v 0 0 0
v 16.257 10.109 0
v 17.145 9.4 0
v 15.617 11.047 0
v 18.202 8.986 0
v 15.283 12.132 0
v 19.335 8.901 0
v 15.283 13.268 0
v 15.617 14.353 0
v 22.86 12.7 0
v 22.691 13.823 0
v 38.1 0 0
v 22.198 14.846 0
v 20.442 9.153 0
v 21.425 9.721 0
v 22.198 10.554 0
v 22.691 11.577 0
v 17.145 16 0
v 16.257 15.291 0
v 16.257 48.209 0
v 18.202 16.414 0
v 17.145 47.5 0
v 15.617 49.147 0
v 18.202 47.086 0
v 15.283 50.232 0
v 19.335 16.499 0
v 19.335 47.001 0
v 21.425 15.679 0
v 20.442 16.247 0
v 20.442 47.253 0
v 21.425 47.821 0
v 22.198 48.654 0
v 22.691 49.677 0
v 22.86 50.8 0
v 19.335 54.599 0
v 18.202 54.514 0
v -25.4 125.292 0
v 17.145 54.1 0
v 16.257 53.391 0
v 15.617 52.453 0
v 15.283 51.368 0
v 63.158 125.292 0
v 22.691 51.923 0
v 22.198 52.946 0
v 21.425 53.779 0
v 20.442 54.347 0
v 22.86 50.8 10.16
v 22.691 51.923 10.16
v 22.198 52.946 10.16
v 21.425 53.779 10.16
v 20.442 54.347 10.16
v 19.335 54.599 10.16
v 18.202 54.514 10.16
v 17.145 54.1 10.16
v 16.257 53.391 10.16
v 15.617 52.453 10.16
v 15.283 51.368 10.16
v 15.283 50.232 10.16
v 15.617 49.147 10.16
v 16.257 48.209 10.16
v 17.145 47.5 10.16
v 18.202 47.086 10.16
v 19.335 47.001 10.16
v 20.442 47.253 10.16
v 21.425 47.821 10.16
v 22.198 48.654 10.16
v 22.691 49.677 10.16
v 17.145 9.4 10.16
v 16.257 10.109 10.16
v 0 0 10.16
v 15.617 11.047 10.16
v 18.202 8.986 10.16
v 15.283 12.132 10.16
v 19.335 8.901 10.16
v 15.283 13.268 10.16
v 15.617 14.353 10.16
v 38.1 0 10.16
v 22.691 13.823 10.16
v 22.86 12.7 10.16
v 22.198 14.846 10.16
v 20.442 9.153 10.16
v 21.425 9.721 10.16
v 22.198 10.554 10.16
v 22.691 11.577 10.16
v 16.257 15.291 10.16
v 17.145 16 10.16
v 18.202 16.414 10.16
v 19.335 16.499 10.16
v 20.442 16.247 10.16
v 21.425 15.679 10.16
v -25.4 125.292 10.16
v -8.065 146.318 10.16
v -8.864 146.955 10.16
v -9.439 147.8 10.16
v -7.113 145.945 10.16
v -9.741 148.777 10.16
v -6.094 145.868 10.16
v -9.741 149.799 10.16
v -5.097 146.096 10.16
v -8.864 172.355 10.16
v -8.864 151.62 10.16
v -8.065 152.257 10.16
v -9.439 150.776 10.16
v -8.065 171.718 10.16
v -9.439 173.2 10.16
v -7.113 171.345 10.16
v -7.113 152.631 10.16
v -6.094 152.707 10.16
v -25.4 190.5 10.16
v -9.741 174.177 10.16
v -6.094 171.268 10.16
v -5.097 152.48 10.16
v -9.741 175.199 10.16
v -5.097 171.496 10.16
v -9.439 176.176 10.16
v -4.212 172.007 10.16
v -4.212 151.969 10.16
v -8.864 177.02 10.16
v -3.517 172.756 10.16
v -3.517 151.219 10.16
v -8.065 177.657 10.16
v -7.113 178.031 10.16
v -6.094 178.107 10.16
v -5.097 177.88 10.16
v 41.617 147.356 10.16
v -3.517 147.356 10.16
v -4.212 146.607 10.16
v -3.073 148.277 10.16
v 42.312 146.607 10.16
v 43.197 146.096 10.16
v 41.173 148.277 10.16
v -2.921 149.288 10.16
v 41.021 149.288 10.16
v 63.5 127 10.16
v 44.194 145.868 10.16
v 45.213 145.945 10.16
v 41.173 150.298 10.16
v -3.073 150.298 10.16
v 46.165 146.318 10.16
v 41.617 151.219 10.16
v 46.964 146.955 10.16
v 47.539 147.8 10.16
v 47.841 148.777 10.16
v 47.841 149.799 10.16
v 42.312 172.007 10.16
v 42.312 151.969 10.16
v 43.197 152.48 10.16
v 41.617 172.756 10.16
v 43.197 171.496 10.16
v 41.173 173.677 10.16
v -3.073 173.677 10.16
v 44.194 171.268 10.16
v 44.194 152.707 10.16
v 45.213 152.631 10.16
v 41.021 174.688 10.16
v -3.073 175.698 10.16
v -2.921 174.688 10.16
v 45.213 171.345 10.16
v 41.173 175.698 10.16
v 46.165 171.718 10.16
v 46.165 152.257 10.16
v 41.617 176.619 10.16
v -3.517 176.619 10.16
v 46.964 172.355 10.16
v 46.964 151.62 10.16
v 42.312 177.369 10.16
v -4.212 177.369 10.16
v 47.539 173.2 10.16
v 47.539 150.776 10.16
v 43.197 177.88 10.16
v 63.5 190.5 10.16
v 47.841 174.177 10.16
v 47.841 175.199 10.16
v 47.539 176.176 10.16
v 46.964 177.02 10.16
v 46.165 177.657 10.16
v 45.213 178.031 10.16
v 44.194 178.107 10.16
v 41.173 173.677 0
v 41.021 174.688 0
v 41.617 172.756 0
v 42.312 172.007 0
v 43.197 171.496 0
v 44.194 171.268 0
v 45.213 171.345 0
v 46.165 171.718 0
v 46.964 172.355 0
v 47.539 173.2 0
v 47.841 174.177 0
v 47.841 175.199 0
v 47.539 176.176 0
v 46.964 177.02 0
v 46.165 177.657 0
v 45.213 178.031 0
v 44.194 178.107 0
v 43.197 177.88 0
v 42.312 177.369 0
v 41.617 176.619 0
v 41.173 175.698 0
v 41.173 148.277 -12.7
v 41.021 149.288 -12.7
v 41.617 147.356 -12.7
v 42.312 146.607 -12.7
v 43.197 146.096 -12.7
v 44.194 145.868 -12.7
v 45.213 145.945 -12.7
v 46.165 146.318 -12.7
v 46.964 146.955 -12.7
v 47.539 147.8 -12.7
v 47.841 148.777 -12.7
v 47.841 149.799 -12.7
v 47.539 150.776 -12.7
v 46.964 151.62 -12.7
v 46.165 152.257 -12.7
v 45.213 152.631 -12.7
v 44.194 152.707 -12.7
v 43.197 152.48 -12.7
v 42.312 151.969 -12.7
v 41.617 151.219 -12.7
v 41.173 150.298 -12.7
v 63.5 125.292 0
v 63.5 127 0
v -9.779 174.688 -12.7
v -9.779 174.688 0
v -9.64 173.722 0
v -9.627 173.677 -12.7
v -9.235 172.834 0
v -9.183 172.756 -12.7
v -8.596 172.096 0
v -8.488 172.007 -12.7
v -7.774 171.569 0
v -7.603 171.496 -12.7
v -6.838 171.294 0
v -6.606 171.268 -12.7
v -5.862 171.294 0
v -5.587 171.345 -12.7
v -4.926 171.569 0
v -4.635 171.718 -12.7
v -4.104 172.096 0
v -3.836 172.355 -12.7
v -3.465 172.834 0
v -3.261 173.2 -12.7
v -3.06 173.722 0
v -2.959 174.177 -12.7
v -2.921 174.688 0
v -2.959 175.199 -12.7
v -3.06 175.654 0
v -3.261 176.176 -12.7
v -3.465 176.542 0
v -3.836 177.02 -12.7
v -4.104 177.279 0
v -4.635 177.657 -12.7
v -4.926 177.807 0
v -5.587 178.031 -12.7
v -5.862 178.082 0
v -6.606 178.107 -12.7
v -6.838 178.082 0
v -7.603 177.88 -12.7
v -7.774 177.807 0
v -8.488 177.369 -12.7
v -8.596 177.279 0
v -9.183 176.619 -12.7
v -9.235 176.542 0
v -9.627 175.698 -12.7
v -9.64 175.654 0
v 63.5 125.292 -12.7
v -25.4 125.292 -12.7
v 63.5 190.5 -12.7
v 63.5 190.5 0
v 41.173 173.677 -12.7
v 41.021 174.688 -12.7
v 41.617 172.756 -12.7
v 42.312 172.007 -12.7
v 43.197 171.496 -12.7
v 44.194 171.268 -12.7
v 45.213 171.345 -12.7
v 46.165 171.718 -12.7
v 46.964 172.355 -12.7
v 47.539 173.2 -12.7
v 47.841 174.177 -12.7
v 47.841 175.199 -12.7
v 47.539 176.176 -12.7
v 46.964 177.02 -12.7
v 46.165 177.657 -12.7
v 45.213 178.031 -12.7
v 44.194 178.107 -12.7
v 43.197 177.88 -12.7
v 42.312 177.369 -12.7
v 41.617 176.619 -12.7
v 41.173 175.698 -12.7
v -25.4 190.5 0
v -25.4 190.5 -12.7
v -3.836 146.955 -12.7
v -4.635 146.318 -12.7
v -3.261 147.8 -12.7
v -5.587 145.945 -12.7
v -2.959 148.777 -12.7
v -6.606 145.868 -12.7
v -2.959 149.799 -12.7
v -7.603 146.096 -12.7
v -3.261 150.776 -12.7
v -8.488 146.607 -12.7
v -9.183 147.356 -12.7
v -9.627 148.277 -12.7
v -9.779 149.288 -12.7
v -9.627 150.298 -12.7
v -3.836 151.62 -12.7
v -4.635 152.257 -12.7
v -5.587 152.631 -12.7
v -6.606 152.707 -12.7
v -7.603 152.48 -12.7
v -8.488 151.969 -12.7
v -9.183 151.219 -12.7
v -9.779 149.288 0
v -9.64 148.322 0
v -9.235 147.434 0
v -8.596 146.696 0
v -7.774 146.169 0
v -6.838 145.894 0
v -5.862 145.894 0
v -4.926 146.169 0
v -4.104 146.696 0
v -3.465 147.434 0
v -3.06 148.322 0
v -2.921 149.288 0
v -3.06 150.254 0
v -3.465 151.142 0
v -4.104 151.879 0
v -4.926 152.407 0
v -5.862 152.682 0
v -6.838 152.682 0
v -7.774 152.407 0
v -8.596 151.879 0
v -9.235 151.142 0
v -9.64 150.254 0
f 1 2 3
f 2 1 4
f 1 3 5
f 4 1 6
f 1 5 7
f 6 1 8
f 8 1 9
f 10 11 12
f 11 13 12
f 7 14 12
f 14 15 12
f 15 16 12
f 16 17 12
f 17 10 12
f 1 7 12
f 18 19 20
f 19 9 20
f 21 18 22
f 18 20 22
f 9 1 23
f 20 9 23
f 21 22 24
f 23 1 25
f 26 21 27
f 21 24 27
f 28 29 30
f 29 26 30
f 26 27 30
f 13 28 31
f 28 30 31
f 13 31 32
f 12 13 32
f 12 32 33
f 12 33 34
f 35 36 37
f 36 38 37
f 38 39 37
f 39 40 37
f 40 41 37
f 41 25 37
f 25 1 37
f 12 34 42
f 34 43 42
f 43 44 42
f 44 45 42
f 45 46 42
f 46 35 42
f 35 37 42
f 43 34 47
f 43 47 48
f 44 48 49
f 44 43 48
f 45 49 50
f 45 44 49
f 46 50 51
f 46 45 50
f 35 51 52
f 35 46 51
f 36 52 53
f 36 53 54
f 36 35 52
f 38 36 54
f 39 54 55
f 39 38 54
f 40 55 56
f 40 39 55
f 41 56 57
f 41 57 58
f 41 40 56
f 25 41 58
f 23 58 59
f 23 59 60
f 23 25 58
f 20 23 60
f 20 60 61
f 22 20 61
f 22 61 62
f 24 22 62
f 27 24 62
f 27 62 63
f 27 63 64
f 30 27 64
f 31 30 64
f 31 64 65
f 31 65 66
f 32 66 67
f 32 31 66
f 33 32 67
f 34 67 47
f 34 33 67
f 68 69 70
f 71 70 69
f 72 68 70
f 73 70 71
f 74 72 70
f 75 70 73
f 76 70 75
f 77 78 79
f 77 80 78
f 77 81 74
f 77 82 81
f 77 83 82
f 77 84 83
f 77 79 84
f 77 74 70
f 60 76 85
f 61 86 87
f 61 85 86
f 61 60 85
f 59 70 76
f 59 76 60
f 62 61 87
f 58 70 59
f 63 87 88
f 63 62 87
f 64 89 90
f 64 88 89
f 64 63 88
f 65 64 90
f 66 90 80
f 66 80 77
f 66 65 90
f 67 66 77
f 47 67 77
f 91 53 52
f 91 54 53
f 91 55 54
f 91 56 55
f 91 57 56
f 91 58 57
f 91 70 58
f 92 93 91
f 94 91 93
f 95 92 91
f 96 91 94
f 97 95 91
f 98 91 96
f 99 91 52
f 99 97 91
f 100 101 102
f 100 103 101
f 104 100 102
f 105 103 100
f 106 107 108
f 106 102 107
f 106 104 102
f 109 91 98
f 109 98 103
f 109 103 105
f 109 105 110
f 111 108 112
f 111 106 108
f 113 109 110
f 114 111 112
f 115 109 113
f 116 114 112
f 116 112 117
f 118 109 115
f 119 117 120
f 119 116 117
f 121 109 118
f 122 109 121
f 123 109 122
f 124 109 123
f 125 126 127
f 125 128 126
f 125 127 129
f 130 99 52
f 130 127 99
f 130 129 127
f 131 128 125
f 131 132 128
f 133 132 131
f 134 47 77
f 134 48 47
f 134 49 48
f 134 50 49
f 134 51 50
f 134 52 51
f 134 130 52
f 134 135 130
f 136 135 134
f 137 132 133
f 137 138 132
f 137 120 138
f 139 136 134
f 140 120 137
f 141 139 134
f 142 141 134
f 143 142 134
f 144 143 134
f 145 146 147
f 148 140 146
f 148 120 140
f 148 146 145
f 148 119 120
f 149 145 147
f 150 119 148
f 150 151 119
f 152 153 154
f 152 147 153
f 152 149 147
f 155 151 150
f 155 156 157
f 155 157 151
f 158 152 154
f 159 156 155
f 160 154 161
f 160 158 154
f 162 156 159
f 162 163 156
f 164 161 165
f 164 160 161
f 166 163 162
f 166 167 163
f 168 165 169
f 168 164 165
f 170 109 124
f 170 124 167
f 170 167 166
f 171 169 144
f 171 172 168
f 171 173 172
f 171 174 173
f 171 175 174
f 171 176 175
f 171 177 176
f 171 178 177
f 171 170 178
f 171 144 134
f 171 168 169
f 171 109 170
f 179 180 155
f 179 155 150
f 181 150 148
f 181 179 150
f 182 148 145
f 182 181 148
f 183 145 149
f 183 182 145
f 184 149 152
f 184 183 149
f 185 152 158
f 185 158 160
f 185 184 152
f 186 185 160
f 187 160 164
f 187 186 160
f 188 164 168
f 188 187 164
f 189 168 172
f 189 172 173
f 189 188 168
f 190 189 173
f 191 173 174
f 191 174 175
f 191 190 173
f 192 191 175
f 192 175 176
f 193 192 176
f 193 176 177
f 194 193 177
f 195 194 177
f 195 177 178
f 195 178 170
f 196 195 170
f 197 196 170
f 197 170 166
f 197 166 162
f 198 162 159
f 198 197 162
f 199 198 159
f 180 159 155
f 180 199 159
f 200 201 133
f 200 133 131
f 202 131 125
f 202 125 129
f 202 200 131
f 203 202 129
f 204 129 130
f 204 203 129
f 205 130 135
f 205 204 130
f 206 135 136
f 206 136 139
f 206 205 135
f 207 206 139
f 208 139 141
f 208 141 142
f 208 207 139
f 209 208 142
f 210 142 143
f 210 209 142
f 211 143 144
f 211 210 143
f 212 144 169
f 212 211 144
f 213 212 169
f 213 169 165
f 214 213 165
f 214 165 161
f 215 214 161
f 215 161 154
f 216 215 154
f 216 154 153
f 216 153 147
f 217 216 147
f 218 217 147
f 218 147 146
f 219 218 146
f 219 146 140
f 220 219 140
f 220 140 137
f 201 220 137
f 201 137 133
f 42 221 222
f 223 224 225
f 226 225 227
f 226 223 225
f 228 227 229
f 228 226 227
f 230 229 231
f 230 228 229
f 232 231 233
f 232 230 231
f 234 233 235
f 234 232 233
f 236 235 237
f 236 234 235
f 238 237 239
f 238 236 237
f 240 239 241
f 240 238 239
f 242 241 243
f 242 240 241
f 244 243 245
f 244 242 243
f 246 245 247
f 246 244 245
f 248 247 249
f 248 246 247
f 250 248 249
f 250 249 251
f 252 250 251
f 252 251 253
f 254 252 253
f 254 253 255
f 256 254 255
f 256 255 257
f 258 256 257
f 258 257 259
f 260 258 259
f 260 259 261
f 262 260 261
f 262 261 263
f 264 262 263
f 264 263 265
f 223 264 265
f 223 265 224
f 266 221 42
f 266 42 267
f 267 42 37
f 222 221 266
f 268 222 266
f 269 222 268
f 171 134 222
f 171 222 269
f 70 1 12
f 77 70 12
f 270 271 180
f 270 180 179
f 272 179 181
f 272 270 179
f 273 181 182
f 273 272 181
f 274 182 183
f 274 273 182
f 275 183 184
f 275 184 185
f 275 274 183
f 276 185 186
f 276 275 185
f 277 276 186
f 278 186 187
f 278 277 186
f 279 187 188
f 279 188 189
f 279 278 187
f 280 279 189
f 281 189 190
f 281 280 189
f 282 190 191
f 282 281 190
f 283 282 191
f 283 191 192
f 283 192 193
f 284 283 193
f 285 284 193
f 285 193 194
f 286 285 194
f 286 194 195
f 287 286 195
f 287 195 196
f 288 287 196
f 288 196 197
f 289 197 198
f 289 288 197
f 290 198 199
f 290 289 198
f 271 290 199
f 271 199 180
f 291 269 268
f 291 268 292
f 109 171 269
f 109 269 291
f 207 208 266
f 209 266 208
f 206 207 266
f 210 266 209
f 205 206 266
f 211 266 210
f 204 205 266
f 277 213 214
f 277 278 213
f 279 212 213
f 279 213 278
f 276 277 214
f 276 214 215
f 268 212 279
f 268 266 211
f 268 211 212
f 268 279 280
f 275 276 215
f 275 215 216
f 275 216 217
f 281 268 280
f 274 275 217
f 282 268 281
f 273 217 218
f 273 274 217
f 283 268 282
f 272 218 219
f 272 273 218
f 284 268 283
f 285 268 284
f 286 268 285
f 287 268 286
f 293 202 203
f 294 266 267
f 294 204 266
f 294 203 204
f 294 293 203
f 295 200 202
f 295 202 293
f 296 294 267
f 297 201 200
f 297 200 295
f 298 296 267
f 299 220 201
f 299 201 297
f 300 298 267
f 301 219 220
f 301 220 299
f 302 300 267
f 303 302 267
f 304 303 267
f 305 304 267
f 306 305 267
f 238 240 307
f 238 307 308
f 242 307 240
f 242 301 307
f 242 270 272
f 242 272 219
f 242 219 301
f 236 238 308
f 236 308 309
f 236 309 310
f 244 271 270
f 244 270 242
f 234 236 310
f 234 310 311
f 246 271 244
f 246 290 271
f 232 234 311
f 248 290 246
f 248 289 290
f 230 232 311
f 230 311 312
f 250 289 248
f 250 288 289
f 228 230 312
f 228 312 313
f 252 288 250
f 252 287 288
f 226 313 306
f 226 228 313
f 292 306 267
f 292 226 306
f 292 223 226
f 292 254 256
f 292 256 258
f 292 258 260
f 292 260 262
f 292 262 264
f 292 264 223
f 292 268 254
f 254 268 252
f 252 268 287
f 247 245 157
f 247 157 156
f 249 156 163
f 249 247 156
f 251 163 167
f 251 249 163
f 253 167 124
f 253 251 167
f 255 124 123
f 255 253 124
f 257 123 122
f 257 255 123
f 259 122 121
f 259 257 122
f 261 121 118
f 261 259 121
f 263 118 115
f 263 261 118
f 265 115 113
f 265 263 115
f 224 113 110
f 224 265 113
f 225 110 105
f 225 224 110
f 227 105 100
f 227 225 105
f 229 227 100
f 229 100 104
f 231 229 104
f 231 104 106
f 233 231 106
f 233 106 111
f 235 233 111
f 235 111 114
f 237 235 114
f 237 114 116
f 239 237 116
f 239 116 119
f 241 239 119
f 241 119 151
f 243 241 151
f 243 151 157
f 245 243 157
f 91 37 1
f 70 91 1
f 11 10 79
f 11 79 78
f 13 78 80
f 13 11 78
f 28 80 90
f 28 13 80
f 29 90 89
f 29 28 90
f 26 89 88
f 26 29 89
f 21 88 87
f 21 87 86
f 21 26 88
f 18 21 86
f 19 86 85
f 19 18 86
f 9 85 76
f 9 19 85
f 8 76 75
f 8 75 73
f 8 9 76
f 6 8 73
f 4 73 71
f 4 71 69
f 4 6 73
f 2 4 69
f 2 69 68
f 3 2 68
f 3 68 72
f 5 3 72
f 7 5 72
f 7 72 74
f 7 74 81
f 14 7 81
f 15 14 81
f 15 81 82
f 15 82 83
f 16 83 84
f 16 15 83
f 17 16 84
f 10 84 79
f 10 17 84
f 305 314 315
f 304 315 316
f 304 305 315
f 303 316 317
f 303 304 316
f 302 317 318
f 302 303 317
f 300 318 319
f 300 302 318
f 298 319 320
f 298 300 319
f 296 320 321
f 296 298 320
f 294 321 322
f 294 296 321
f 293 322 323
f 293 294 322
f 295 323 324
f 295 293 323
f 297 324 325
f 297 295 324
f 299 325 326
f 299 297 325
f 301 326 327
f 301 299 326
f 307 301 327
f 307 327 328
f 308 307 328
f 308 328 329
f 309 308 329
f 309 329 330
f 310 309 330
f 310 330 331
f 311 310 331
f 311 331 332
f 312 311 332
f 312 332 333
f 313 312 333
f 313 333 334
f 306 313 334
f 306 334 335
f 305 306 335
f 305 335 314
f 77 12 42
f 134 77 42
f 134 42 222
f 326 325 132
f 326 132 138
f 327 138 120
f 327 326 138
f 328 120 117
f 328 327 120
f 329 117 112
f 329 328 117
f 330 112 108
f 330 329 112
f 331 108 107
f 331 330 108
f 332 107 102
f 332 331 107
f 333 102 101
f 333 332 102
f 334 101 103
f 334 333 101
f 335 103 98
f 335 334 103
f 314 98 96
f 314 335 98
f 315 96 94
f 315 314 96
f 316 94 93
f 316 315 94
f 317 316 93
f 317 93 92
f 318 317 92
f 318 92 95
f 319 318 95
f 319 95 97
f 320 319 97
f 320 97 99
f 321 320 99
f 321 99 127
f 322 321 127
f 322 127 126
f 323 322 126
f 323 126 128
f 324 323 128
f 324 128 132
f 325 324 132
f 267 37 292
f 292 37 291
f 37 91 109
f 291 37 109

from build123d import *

# Parameters (mm, degrees)
SKETCH1_R           = 3.81
SKETCH1_R_2         = 3.429
BOSS_EXTRUDE1_DEPTH = 10.16
SKETCH2_W           = 88.9
SKETCH2_H           = 65.208376681
BOSS_EXTRUDE2_DEPTH = 12.7
CUT_EXTRUDE1_START  = -12.7
SKETCH1_3_R         = 3.429
CUT_EXTRUDE1_DEPTH  = 12.7


with BuildPart() as part:
    # Sketch1 → Boss-Extrude1 (new body)
    with BuildSketch(Plane.XY):
        Polygon((0, 0), (38.1, 0), (63.5, 127), (63.5, 190.5), (-25.4, 190.5), (-25.4, 125.291623319), align=None)
        with Locations((19.05, 12.7)):
            Circle(SKETCH1_R, mode=Mode.SUBTRACT)
        with Locations((19.05, 50.8)):
            Circle(SKETCH1_R, mode=Mode.SUBTRACT)
        with Locations((-6.35, 174.687730396)):
            Circle(SKETCH1_R_2, mode=Mode.SUBTRACT)
        with Locations((-6.35, 149.287730396)):
            Circle(SKETCH1_R_2, mode=Mode.SUBTRACT)
        with Locations(Location((44.45, 149.287730396, 0), (0, 0, 180))):
            Circle(SKETCH1_R_2, mode=Mode.SUBTRACT)
        with Locations(Location((44.45, 174.687730396, 0), (0, 0, 180))):
            Circle(SKETCH1_R_2, mode=Mode.SUBTRACT)
    extrude(amount=BOSS_EXTRUDE1_DEPTH)

    # Sketch2 → Boss-Extrude2 (add)
    with BuildSketch(Plane(origin=(0, 0, 0), x_dir=(-1, 0, 0), z_dir=(0, 0, -1))):
        with Locations((-19.05, 157.895811659)):
            Rectangle(SKETCH2_W, SKETCH2_H)
    extrude(amount=BOSS_EXTRUDE2_DEPTH)

    # Sketch1<3> → Cut-Extrude1 (cut)
    with BuildSketch(Plane.XY.offset(CUT_EXTRUDE1_START)):
        with Locations(Location((-6.35, 174.687730396, 0), (0, 0, 180))):
            Circle(SKETCH1_3_R)
        with Locations(Location((-6.35, 149.287730396, 0), (0, 0, 180))):
            Circle(SKETCH1_3_R)
        with Locations(Location((44.45, 149.287730396, 0), (0, 0, 180))):
            Circle(SKETCH1_3_R)
        with Locations(Location((44.45, 174.687730396, 0), (0, 0, 180))):
            Circle(SKETCH1_3_R)
    extrude(amount=CUT_EXTRUDE1_DEPTH, mode=Mode.SUBTRACT)


solid = part.part
